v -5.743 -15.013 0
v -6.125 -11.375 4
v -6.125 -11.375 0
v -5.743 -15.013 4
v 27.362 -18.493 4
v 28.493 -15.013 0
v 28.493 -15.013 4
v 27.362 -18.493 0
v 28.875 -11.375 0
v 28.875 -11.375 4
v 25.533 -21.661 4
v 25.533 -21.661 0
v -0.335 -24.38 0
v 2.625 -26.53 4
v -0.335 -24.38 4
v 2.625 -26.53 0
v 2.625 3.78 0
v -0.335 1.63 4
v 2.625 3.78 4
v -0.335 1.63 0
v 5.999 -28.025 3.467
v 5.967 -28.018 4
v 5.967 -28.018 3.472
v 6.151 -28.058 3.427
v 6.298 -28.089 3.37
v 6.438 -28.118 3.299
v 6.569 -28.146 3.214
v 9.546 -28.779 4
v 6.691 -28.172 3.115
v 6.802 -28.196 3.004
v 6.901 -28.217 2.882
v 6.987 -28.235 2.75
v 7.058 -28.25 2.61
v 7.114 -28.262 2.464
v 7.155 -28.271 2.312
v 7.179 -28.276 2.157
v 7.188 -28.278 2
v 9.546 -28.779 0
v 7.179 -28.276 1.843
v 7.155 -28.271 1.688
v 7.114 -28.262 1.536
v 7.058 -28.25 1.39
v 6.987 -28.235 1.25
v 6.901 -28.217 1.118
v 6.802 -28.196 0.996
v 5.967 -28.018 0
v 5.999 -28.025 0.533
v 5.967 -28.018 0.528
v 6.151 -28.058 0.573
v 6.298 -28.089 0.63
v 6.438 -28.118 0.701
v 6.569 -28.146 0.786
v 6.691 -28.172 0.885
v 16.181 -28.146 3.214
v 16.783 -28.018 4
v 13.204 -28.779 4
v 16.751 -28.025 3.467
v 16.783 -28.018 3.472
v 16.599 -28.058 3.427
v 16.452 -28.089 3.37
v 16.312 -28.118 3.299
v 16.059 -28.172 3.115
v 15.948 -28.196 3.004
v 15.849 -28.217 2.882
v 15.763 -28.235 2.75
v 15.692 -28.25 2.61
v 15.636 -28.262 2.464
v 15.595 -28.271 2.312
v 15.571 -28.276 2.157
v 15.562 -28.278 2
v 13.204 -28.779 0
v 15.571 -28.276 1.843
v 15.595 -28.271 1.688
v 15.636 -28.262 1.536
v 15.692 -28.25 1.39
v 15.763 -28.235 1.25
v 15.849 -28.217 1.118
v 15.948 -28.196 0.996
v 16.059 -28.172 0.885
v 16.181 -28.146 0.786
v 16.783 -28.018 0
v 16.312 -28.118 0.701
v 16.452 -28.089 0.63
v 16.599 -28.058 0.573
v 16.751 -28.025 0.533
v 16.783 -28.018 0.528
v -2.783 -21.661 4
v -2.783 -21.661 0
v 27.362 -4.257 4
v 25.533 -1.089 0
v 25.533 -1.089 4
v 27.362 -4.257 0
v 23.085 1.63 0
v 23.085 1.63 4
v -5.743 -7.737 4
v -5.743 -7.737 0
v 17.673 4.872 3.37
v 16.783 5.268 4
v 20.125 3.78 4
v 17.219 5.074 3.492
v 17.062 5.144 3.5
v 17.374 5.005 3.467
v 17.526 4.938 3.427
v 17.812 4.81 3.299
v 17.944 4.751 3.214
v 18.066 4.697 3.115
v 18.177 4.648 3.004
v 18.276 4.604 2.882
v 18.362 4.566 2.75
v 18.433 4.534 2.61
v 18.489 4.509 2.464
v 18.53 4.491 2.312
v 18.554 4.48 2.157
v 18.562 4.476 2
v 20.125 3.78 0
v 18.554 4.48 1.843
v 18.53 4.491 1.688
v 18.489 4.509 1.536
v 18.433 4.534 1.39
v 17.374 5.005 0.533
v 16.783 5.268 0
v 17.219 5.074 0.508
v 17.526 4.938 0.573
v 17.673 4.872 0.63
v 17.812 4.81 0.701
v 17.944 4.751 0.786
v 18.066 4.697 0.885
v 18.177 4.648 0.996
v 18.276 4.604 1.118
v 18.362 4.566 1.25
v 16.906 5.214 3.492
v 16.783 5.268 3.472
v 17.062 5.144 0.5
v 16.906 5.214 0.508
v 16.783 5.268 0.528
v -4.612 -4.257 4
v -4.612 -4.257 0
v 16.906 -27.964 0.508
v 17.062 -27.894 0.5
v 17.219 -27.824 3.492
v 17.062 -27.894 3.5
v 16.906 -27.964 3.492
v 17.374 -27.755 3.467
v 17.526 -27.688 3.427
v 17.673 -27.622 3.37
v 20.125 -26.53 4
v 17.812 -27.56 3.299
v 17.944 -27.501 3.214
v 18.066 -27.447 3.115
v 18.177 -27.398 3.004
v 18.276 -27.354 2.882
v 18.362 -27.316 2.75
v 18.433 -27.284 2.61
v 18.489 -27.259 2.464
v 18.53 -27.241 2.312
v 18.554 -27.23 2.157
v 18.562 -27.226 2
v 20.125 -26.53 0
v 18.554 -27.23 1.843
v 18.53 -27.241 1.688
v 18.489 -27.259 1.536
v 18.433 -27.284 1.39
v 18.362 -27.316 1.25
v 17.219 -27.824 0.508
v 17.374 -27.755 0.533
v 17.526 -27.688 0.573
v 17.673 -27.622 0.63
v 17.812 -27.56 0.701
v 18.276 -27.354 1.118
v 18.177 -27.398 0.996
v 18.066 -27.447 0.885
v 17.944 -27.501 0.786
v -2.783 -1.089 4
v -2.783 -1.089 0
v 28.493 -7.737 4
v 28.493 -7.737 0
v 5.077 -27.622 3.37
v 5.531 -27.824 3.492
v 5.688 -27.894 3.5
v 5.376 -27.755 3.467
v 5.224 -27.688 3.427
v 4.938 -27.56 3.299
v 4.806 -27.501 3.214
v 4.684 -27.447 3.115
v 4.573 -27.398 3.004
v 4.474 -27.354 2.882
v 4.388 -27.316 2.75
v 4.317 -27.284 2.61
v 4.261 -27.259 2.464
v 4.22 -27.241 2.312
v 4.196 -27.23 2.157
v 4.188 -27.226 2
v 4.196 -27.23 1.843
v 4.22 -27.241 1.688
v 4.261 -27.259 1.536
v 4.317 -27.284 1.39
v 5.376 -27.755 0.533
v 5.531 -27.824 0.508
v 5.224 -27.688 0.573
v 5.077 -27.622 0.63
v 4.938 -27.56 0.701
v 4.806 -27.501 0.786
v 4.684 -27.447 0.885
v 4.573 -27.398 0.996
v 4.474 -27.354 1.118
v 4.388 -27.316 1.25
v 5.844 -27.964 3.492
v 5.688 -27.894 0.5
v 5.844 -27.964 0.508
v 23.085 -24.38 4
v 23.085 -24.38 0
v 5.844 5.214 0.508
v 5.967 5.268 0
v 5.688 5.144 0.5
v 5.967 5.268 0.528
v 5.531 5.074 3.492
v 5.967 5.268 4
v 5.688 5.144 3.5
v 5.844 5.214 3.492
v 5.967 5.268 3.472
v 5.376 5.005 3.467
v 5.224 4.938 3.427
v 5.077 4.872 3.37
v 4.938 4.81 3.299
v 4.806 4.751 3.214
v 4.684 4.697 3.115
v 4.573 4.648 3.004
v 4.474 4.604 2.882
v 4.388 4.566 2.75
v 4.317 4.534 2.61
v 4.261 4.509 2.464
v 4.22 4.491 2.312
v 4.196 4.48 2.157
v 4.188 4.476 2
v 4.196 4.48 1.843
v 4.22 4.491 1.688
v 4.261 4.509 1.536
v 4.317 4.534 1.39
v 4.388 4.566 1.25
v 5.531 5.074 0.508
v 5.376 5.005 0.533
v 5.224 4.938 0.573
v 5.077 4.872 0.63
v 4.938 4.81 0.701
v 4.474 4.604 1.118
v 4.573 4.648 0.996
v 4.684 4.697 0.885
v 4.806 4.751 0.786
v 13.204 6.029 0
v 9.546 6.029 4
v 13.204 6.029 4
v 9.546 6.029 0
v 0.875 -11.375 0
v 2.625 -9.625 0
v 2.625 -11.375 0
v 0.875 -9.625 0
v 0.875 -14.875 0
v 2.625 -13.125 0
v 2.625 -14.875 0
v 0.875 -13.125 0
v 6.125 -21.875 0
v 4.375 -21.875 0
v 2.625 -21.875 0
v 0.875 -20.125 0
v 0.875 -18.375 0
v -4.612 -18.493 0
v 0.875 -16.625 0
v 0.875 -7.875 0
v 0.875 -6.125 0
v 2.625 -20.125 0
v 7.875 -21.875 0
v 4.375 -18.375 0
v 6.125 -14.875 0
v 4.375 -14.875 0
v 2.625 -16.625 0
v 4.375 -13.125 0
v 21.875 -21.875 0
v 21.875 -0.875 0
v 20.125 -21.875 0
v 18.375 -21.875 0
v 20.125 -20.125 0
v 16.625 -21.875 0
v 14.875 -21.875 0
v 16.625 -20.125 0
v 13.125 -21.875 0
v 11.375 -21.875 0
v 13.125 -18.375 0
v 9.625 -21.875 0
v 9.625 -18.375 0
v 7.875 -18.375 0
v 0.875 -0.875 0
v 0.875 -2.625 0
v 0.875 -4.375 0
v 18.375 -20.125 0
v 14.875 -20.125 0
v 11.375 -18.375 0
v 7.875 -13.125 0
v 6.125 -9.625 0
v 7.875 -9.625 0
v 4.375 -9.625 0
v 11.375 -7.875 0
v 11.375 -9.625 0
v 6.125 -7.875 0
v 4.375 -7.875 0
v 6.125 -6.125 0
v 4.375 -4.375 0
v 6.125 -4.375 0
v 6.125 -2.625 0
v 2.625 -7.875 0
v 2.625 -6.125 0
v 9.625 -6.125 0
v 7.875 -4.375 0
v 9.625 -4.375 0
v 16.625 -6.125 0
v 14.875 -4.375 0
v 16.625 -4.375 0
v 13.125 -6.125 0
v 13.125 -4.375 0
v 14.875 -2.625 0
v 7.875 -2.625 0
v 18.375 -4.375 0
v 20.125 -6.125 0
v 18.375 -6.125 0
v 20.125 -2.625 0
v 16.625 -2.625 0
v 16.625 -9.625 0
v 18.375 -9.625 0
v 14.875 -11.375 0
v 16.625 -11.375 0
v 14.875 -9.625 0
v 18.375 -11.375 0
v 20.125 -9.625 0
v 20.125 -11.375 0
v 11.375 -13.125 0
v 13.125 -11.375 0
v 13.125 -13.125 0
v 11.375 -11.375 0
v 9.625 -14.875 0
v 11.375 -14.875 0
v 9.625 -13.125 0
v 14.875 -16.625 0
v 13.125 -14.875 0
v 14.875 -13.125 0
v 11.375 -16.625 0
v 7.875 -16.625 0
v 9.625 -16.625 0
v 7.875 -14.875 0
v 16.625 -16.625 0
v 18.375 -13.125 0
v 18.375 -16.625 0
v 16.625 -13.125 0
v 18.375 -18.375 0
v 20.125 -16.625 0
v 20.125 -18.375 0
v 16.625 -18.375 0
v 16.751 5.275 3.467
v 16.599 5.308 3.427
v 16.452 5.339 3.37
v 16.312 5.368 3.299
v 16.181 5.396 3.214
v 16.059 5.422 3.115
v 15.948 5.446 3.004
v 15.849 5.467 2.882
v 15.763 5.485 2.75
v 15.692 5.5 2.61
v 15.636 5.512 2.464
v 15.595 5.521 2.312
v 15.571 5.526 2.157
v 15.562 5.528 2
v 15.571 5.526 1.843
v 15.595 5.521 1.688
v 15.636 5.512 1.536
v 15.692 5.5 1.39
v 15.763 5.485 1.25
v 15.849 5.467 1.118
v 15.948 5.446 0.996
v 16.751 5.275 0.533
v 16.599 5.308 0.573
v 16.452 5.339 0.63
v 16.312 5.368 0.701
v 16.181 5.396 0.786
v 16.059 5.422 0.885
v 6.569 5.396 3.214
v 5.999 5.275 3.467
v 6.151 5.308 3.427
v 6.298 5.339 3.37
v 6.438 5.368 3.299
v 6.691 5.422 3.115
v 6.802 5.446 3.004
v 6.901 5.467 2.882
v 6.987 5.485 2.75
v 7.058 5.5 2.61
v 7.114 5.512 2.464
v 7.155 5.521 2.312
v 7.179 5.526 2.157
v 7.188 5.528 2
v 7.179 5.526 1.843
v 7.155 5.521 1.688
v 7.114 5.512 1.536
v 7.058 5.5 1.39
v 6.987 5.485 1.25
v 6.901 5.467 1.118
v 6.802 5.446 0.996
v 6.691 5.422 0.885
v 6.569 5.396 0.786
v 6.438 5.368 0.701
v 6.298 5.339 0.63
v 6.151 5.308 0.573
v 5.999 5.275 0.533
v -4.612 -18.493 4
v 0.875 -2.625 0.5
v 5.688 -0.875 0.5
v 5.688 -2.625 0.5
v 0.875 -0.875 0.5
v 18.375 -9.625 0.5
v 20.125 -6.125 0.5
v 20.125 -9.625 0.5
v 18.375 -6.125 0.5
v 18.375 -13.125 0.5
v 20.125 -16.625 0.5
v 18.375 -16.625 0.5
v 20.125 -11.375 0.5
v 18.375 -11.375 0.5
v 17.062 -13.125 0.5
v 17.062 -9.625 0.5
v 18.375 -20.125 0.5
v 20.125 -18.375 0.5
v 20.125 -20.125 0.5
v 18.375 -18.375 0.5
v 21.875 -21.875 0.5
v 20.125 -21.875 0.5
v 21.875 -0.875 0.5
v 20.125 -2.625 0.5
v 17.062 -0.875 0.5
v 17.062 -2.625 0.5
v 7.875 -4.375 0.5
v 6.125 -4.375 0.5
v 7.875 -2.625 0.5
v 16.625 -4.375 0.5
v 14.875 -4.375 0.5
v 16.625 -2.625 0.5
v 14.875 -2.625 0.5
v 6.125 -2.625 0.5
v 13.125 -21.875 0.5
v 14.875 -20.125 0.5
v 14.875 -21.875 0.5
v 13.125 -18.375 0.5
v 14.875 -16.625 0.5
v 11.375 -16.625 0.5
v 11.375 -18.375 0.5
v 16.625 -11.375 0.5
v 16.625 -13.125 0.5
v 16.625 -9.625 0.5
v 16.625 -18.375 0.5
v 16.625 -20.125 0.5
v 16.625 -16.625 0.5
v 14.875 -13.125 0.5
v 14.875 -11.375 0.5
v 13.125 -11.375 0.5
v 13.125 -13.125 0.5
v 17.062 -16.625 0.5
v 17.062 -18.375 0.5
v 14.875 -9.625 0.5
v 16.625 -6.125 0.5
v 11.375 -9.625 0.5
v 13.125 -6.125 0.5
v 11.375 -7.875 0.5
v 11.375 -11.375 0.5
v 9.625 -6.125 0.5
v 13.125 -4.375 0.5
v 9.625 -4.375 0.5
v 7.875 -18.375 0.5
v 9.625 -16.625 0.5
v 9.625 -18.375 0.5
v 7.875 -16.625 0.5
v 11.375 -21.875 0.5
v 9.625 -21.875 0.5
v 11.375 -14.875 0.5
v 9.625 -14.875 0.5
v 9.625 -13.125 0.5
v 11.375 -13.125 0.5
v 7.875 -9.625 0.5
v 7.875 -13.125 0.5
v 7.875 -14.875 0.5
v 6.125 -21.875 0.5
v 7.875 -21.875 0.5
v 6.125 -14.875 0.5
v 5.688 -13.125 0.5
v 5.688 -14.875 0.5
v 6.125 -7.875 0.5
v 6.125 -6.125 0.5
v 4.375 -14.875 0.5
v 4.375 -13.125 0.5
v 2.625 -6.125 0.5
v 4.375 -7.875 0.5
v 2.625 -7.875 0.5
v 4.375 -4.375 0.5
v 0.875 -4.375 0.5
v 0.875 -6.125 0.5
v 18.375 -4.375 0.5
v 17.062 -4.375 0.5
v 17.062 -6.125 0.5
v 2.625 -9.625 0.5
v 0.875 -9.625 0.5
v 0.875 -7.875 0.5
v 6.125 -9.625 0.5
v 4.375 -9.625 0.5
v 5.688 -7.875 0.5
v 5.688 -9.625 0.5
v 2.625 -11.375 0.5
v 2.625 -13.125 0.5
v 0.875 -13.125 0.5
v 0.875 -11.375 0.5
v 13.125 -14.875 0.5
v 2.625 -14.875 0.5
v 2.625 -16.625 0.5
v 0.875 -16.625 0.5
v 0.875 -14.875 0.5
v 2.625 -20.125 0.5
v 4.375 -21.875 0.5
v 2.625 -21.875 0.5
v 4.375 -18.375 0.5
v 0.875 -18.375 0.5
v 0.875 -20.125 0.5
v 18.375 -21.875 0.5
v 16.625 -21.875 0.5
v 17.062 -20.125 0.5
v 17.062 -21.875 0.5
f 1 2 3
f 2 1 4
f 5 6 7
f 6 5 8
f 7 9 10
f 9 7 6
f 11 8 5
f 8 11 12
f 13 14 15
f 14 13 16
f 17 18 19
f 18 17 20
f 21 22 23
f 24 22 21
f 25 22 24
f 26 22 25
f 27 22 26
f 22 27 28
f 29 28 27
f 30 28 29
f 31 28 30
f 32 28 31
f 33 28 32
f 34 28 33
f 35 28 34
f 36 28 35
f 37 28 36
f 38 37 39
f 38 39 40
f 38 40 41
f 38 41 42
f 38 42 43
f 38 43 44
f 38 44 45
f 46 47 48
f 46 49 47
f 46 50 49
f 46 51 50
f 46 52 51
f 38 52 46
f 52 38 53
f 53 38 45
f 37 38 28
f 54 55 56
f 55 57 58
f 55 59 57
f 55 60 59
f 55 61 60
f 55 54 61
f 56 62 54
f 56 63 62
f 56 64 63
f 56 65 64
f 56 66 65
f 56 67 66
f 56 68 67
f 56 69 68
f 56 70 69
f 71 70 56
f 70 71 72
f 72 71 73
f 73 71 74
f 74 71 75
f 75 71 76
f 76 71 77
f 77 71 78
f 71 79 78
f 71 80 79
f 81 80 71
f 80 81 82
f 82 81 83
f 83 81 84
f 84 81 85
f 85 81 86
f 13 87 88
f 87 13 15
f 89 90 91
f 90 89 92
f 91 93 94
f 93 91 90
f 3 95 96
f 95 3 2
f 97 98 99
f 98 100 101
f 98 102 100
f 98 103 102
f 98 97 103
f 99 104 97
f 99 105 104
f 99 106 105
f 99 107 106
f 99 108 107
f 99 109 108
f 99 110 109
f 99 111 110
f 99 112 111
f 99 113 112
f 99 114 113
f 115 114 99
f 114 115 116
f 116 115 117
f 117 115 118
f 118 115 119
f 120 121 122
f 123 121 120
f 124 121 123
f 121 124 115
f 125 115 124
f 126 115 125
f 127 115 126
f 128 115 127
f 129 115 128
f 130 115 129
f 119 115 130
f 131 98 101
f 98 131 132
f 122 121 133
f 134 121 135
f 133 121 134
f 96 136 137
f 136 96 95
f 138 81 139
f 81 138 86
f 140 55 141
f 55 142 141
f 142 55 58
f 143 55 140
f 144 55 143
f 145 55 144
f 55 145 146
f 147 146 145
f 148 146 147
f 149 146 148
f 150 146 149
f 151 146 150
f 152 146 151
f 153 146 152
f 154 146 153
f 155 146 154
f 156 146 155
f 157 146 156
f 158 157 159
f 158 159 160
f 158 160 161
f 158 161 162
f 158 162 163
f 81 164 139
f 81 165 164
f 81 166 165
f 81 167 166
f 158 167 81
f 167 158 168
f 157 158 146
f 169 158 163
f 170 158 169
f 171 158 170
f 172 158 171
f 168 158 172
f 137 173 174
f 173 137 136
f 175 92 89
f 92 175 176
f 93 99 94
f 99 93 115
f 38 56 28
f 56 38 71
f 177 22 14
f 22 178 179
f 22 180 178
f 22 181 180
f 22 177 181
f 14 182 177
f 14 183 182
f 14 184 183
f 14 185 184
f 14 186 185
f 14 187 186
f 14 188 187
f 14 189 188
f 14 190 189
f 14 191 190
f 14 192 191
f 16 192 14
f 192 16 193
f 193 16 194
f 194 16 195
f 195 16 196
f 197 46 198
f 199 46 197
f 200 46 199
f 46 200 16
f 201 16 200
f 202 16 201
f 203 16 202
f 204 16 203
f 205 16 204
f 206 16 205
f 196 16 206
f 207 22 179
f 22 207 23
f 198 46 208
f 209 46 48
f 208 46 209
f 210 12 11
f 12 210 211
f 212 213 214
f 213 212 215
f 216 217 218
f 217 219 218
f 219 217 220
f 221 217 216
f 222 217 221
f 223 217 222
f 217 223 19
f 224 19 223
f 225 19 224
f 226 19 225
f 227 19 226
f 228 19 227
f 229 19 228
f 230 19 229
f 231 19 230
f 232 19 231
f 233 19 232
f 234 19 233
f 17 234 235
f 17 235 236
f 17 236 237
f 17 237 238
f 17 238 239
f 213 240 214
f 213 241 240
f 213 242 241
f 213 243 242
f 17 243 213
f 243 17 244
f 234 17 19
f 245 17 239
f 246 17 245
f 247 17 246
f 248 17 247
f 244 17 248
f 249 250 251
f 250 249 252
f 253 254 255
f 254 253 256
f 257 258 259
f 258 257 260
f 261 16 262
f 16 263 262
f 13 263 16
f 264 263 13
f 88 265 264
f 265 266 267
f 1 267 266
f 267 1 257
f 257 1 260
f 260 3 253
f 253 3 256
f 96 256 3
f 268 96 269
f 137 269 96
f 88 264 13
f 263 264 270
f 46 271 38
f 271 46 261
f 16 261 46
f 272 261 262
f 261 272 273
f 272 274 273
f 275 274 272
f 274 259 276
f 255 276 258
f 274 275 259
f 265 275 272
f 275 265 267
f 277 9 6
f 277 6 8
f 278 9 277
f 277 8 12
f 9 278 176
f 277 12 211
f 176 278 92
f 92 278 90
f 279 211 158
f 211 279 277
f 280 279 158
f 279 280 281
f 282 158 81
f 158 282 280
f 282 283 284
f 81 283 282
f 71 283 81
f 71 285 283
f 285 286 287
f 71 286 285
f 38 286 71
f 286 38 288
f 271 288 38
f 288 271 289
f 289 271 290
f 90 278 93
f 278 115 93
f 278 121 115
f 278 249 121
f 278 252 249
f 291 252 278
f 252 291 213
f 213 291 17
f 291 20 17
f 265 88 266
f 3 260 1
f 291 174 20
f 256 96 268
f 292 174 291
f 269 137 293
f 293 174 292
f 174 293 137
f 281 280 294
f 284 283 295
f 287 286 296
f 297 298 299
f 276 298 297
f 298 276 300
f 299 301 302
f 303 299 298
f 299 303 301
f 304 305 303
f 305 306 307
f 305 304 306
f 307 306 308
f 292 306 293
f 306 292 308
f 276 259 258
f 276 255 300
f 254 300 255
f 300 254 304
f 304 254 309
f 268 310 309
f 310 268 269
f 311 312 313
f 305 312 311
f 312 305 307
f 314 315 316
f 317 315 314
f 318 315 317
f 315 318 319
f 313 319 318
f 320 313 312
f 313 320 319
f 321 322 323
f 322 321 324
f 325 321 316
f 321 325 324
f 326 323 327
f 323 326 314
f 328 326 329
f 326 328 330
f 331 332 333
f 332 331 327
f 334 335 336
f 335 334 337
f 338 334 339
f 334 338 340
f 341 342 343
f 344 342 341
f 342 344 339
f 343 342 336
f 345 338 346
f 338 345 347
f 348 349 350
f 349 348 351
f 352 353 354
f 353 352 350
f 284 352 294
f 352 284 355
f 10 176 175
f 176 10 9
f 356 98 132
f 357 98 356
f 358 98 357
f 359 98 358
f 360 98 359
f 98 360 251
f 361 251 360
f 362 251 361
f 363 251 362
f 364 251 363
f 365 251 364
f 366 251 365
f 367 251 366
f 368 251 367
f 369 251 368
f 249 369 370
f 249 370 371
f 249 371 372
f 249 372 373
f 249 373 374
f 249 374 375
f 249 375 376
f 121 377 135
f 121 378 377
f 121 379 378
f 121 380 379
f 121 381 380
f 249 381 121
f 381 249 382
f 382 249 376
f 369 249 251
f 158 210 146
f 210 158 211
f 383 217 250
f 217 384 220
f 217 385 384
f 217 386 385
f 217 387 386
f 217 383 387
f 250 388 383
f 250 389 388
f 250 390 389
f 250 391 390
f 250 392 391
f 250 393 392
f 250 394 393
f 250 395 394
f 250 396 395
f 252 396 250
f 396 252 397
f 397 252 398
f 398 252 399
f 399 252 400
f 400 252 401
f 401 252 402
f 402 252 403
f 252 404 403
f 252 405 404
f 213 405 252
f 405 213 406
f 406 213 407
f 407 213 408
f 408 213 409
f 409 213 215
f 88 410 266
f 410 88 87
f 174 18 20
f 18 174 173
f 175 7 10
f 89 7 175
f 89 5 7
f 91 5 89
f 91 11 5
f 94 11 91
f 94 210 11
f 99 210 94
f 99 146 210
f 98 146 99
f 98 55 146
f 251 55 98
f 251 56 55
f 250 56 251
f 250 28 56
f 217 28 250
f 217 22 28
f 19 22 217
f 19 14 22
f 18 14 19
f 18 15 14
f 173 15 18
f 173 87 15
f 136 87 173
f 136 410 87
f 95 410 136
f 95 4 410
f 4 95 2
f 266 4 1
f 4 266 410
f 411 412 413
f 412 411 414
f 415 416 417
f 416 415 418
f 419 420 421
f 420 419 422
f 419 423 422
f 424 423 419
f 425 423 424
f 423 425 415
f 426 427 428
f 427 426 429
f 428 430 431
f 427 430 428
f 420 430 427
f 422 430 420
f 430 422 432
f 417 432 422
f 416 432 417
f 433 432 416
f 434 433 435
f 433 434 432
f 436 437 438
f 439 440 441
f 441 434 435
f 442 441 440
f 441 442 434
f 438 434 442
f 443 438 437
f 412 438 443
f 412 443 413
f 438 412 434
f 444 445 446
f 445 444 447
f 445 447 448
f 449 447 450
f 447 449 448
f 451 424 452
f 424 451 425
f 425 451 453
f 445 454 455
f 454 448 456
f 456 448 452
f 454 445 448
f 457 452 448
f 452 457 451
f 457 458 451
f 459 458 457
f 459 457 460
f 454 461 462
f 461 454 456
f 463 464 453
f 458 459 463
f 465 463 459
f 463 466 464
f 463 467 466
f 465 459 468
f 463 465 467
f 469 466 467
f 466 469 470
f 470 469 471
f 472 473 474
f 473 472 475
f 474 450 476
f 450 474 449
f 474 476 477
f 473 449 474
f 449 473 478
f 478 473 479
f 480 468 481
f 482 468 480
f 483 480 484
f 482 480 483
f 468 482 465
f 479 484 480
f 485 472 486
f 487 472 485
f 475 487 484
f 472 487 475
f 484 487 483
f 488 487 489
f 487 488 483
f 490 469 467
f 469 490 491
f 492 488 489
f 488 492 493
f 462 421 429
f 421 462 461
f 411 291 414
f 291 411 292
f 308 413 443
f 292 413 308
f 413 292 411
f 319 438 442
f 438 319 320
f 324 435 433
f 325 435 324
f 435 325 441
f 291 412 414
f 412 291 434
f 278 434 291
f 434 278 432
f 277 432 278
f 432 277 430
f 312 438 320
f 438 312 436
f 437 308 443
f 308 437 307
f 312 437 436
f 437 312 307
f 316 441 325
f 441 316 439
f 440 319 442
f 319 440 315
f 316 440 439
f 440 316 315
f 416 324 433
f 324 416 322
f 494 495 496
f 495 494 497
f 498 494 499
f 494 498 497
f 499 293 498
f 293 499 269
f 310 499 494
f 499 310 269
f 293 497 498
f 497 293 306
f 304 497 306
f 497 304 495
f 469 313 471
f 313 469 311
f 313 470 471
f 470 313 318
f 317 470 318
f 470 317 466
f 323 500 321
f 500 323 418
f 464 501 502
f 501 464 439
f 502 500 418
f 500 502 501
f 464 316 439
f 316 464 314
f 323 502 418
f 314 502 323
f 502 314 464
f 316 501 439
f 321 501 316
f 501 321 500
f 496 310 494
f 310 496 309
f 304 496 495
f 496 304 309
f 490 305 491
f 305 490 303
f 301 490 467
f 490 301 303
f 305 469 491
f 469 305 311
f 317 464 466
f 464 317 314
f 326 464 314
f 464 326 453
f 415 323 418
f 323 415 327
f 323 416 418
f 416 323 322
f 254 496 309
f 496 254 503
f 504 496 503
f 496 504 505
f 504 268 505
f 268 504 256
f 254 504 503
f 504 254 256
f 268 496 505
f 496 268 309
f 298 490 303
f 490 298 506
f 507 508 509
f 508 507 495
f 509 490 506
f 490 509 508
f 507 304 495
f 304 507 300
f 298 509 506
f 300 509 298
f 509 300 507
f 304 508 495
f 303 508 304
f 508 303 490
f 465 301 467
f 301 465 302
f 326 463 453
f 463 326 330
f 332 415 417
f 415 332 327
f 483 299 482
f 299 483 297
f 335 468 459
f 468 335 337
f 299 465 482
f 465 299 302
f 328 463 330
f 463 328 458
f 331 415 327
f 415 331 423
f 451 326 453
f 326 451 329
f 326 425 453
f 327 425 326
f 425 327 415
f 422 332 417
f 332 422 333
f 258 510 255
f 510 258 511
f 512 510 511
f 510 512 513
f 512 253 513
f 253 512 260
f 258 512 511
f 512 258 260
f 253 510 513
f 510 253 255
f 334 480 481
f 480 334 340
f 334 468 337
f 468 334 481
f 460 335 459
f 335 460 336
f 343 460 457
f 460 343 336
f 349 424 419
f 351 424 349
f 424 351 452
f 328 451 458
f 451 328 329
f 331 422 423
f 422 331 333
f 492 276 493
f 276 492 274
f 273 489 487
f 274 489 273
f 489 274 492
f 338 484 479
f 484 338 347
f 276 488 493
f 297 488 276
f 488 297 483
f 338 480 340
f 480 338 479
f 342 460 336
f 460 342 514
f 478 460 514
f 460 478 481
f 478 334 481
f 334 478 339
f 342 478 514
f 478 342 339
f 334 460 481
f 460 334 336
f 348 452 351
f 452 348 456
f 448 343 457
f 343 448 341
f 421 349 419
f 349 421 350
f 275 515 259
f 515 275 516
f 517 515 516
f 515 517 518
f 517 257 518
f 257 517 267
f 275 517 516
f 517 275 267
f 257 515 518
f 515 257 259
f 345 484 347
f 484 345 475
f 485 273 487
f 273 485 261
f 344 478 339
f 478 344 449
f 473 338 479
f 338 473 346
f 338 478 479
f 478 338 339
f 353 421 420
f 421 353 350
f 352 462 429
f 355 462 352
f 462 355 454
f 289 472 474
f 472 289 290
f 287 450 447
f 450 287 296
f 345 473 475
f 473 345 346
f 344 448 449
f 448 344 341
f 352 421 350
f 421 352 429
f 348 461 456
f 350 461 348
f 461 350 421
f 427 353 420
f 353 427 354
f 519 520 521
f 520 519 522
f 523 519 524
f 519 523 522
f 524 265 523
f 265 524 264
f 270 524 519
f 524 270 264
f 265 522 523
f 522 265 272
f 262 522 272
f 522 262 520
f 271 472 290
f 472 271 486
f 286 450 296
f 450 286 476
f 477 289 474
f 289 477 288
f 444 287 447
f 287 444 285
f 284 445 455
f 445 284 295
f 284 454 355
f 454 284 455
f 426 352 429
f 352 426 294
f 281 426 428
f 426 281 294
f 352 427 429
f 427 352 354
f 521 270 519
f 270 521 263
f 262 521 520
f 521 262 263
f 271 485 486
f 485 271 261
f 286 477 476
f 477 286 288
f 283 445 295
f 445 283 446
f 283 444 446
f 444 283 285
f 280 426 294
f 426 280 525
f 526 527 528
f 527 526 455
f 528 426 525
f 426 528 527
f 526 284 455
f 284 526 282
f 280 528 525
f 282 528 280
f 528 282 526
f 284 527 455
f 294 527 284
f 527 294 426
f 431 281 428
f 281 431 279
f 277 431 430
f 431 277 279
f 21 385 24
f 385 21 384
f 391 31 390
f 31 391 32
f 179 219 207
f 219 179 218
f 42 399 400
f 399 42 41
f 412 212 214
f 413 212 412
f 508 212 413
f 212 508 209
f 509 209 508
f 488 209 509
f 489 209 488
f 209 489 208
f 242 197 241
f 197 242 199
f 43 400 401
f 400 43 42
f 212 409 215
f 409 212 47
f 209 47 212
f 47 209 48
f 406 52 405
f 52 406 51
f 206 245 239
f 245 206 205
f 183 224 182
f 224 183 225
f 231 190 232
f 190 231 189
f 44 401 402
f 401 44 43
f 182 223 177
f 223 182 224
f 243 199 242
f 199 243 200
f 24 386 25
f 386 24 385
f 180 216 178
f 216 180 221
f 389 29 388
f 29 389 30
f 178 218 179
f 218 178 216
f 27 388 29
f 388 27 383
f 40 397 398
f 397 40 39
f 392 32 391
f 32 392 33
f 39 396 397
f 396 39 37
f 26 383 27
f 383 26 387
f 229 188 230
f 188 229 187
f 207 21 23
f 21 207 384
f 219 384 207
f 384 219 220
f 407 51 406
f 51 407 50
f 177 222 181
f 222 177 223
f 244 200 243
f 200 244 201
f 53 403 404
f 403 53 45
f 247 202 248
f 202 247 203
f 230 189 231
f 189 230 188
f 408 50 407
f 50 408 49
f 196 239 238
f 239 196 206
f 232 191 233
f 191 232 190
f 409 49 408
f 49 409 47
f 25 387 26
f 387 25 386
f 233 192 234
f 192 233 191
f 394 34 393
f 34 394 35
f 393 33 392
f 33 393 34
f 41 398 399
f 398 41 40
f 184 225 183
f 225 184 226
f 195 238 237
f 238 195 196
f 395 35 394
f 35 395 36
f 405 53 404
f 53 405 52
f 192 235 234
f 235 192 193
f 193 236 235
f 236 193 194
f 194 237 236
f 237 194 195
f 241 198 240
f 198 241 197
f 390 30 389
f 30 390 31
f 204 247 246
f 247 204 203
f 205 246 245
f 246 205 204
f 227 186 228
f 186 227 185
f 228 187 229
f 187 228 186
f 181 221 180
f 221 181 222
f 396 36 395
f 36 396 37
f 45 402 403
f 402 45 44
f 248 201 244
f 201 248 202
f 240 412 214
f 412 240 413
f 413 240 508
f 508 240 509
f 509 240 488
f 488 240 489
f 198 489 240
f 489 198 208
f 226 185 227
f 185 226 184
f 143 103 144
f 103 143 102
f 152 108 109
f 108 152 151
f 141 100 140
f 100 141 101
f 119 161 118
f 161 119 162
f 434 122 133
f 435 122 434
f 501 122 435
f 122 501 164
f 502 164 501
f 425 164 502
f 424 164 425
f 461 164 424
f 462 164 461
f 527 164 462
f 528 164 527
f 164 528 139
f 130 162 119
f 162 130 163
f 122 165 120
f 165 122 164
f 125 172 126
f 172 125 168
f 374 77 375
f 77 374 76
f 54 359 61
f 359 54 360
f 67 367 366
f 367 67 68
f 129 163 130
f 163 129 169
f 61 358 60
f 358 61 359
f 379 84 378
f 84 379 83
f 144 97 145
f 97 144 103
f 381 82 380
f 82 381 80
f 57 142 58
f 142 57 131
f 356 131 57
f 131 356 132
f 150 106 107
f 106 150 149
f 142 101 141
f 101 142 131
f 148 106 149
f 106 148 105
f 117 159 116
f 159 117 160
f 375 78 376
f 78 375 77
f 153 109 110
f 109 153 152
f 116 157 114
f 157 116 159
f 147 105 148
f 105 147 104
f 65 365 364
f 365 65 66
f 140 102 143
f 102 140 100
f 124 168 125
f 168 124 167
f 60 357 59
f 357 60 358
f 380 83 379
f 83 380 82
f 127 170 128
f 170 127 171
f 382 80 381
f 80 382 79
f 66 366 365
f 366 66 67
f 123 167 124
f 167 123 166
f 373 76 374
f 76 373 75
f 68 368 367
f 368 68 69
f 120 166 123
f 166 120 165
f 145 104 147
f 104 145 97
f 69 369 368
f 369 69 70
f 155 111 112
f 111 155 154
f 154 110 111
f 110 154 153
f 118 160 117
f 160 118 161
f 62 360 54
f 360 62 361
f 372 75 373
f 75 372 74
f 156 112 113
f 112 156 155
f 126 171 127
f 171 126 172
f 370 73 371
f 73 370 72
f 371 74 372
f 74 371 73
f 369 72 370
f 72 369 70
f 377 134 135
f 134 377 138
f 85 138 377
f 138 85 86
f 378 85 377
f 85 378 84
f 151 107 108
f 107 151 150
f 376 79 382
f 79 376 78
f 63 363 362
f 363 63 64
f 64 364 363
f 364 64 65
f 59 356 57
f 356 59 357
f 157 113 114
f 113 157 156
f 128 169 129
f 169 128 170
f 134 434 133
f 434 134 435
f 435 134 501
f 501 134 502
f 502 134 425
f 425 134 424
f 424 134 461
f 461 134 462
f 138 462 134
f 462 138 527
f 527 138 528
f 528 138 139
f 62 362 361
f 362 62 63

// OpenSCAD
rotate([180,0,0])difference(){translate([11.375,11.375,-2])  cylinder(r=17.5,h=4, center=true);
translate([1.75,1.75,0])  cube(size = [1.75,1.75,1], center=true);
translate([3.5,1.75,0])  cube(size = [1.75,1.75,1], center=true);
translate([5.25,1.75,0])  cube(size = [1.75,1.75,1], center=true);
translate([7,1.75,0])  cube(size = [1.75,1.75,1], center=true);
translate([8.75,1.75,0])  cube(size = [1.75,1.75,1], center=true);
translate([10.5,1.75,0])  cube(size = [1.75,1.75,1], center=true);
translate([12.25,1.75,0])  cube(size = [1.75,1.75,1], center=true);
translate([14,1.75,0])  cube(size = [1.75,1.75,1], center=true);
translate([15.75,1.75,0])  cube(size = [1.75,1.75,1], center=true);
translate([17.5,1.75,0])  cube(size = [1.75,1.75,1], center=true);
translate([19.25,1.75,0])  cube(size = [1.75,1.75,1], center=true);
translate([21,1.75,0])  cube(size = [1.75,1.75,1], center=true);
translate([21,1.75,0])  cube(size = [1.75,1.75,1], center=true);
translate([21,1.75,0])  cube(size = [1.75,1.75,1], center=true);
translate([21,1.75,0])  cube(size = [1.75,1.75,1], center=true);
translate([7,3.5,0])  cube(size = [1.75,1.75,1], center=true);
translate([7,3.5,0])  cube(size = [1.75,1.75,1], center=true);
translate([7,3.5,0])  cube(size = [1.75,1.75,1], center=true);
translate([7,3.5,0])  cube(size = [1.75,1.75,1], center=true);
translate([7,3.5,0])  cube(size = [1.75,1.75,1], center=true);
translate([15.75,3.5,0])  cube(size = [1.75,1.75,1], center=true);
translate([15.75,3.5,0])  cube(size = [1.75,1.75,1], center=true);
translate([15.75,3.5,0])  cube(size = [1.75,1.75,1], center=true);
translate([21,3.5,0])  cube(size = [1.75,1.75,1], center=true);
translate([1.75,5.25,0])  cube(size = [1.75,1.75,1], center=true);
translate([3.5,5.25,0])  cube(size = [1.75,1.75,1], center=true);
translate([3.5,5.25,0])  cube(size = [1.75,1.75,1], center=true);
translate([3.5,5.25,0])  cube(size = [1.75,1.75,1], center=true);
translate([3.5,5.25,0])  cube(size = [1.75,1.75,1], center=true);
translate([10.5,5.25,0])  cube(size = [1.75,1.75,1], center=true);
translate([12.25,5.25,0])  cube(size = [1.75,1.75,1], center=true);
translate([12.25,5.25,0])  cube(size = [1.75,1.75,1], center=true);
translate([12.25,5.25,0])  cube(size = [1.75,1.75,1], center=true);
translate([17.5,5.25,0])  cube(size = [1.75,1.75,1], center=true);
translate([17.5,5.25,0])  cube(size = [1.75,1.75,1], center=true);
translate([21,5.25,0])  cube(size = [1.75,1.75,1], center=true);
translate([21,5.25,0])  cube(size = [1.75,1.75,1], center=true);
translate([3.5,7,0])  cube(size = [1.75,1.75,1], center=true);
translate([3.5,7,0])  cube(size = [1.75,1.75,1], center=true);
translate([7,7,0])  cube(size = [1.75,1.75,1], center=true);
translate([8.75,7,0])  cube(size = [1.75,1.75,1], center=true);
translate([10.5,7,0])  cube(size = [1.75,1.75,1], center=true);
translate([12.25,7,0])  cube(size = [1.75,1.75,1], center=true);
translate([14,7,0])  cube(size = [1.75,1.75,1], center=true);
translate([15.75,7,0])  cube(size = [1.75,1.75,1], center=true);
translate([15.75,7,0])  cube(size = [1.75,1.75,1], center=true);
translate([19.25,7,0])  cube(size = [1.75,1.75,1], center=true);
translate([21,7,0])  cube(size = [1.75,1.75,1], center=true);
translate([1.75,8.75,0])  cube(size = [1.75,1.75,1], center=true);
translate([1.75,8.75,0])  cube(size = [1.75,1.75,1], center=true);
translate([5.25,8.75,0])  cube(size = [1.75,1.75,1], center=true);
translate([5.25,8.75,0])  cube(size = [1.75,1.75,1], center=true);
translate([5.25,8.75,0])  cube(size = [1.75,1.75,1], center=true);
translate([5.25,8.75,0])  cube(size = [1.75,1.75,1], center=true);
translate([12.25,8.75,0])  cube(size = [1.75,1.75,1], center=true);
translate([14,8.75,0])  cube(size = [1.75,1.75,1], center=true);
translate([15.75,8.75,0])  cube(size = [1.75,1.75,1], center=true);
translate([15.75,8.75,0])  cube(size = [1.75,1.75,1], center=true);
translate([19.25,8.75,0])  cube(size = [1.75,1.75,1], center=true);
translate([21,8.75,0])  cube(size = [1.75,1.75,1], center=true);
translate([21,8.75,0])  cube(size = [1.75,1.75,1], center=true);
translate([21,8.75,0])  cube(size = [1.75,1.75,1], center=true);
translate([21,8.75,0])  cube(size = [1.75,1.75,1], center=true);
translate([21,8.75,0])  cube(size = [1.75,1.75,1], center=true);
translate([8.75,10.5,0])  cube(size = [1.75,1.75,1], center=true);
translate([10.5,10.5,0])  cube(size = [1.75,1.75,1], center=true);
translate([12.25,10.5,0])  cube(size = [1.75,1.75,1], center=true);
translate([14,10.5,0])  cube(size = [1.75,1.75,1], center=true);
translate([14,10.5,0])  cube(size = [1.75,1.75,1], center=true);
translate([17.5,10.5,0])  cube(size = [1.75,1.75,1], center=true);
translate([17.5,10.5,0])  cube(size = [1.75,1.75,1], center=true);
translate([21,10.5,0])  cube(size = [1.75,1.75,1], center=true);
translate([1.75,12.25,0])  cube(size = [1.75,1.75,1], center=true);
translate([1.75,12.25,0])  cube(size = [1.75,1.75,1], center=true);
translate([1.75,12.25,0])  cube(size = [1.75,1.75,1], center=true);
translate([1.75,12.25,0])  cube(size = [1.75,1.75,1], center=true);
translate([8.75,12.25,0])  cube(size = [1.75,1.75,1], center=true);
translate([10.5,12.25,0])  cube(size = [1.75,1.75,1], center=true);
translate([10.5,12.25,0])  cube(size = [1.75,1.75,1], center=true);
translate([14,12.25,0])  cube(size = [1.75,1.75,1], center=true);
translate([15.75,12.25,0])  cube(size = [1.75,1.75,1], center=true);
translate([17.5,12.25,0])  cube(size = [1.75,1.75,1], center=true);
translate([19.25,12.25,0])  cube(size = [1.75,1.75,1], center=true);
translate([21,12.25,0])  cube(size = [1.75,1.75,1], center=true);
translate([21,12.25,0])  cube(size = [1.75,1.75,1], center=true);
translate([21,12.25,0])  cube(size = [1.75,1.75,1], center=true);
translate([5.25,14,0])  cube(size = [1.75,1.75,1], center=true);
translate([7,14,0])  cube(size = [1.75,1.75,1], center=true);
translate([8.75,14,0])  cube(size = [1.75,1.75,1], center=true);
translate([8.75,14,0])  cube(size = [1.75,1.75,1], center=true);
translate([12.25,14,0])  cube(size = [1.75,1.75,1], center=true);
translate([12.25,14,0])  cube(size = [1.75,1.75,1], center=true);
translate([15.75,14,0])  cube(size = [1.75,1.75,1], center=true);
translate([15.75,14,0])  cube(size = [1.75,1.75,1], center=true);
translate([19.25,14,0])  cube(size = [1.75,1.75,1], center=true);
translate([21,14,0])  cube(size = [1.75,1.75,1], center=true);
translate([1.75,15.75,0])  cube(size = [1.75,1.75,1], center=true);
translate([1.75,15.75,0])  cube(size = [1.75,1.75,1], center=true);
translate([1.75,15.75,0])  cube(size = [1.75,1.75,1], center=true);
translate([7,15.75,0])  cube(size = [1.75,1.75,1], center=true);
translate([7,15.75,0])  cube(size = [1.75,1.75,1], center=true);
translate([10.5,15.75,0])  cube(size = [1.75,1.75,1], center=true);
translate([10.5,15.75,0])  cube(size = [1.75,1.75,1], center=true);
translate([10.5,15.75,0])  cube(size = [1.75,1.75,1], center=true);
translate([15.75,15.75,0])  cube(size = [1.75,1.75,1], center=true);
translate([15.75,15.75,0])  cube(size = [1.75,1.75,1], center=true);
translate([19.25,15.75,0])  cube(size = [1.75,1.75,1], center=true);
translate([21,15.75,0])  cube(size = [1.75,1.75,1], center=true);
translate([21,15.75,0])  cube(size = [1.75,1.75,1], center=true);
translate([21,15.75,0])  cube(size = [1.75,1.75,1], center=true);
translate([21,15.75,0])  cube(size = [1.75,1.75,1], center=true);
translate([7,17.5,0])  cube(size = [1.75,1.75,1], center=true);
translate([8.75,17.5,0])  cube(size = [1.75,1.75,1], center=true);
translate([10.5,17.5,0])  cube(size = [1.75,1.75,1], center=true);
translate([12.25,17.5,0])  cube(size = [1.75,1.75,1], center=true);
translate([14,17.5,0])  cube(size = [1.75,1.75,1], center=true);
translate([15.75,17.5,0])  cube(size = [1.75,1.75,1], center=true);
translate([17.5,17.5,0])  cube(size = [1.75,1.75,1], center=true);
translate([17.5,17.5,0])  cube(size = [1.75,1.75,1], center=true);
translate([21,17.5,0])  cube(size = [1.75,1.75,1], center=true);
translate([1.75,19.25,0])  cube(size = [1.75,1.75,1], center=true);
translate([3.5,19.25,0])  cube(size = [1.75,1.75,1], center=true);
translate([3.5,19.25,0])  cube(size = [1.75,1.75,1], center=true);
translate([7,19.25,0])  cube(size = [1.75,1.75,1], center=true);
translate([7,19.25,0])  cube(size = [1.75,1.75,1], center=true);
translate([10.5,19.25,0])  cube(size = [1.75,1.75,1], center=true);
translate([10.5,19.25,0])  cube(size = [1.75,1.75,1], center=true);
translate([14,19.25,0])  cube(size = [1.75,1.75,1], center=true);
translate([15.75,19.25,0])  cube(size = [1.75,1.75,1], center=true);
translate([15.75,19.25,0])  cube(size = [1.75,1.75,1], center=true);
translate([19.25,19.25,0])  cube(size = [1.75,1.75,1], center=true);
translate([21,19.25,0])  cube(size = [1.75,1.75,1], center=true);
translate([21,19.25,0])  cube(size = [1.75,1.75,1], center=true);
translate([3.5,21,0])  cube(size = [1.75,1.75,1], center=true);
translate([3.5,21,0])  cube(size = [1.75,1.75,1], center=true);
translate([7,21,0])  cube(size = [1.75,1.75,1], center=true);
translate([7,21,0])  cube(size = [1.75,1.75,1], center=true);
translate([10.5,21,0])  cube(size = [1.75,1.75,1], center=true);
translate([10.5,21,0])  cube(size = [1.75,1.75,1], center=true);
translate([14,21,0])  cube(size = [1.75,1.75,1], center=true);
translate([14,21,0])  cube(size = [1.75,1.75,1], center=true);
translate([17.5,21,0])  cube(size = [1.75,1.75,1], center=true);
translate([17.5,21,0])  cube(size = [1.75,1.75,1], center=true);
translate([21,21,0])  cube(size = [1.75,1.75,1], center=true);
rotate([90,90,0])translate([2,5.6875,0])  cylinder(r=1.5,h=400, $fn=60, center=true);
rotate([90,90,0])translate([2,17.0625,0])  cylinder(r=1.5,h=400, $fn=60, center=true);
}
